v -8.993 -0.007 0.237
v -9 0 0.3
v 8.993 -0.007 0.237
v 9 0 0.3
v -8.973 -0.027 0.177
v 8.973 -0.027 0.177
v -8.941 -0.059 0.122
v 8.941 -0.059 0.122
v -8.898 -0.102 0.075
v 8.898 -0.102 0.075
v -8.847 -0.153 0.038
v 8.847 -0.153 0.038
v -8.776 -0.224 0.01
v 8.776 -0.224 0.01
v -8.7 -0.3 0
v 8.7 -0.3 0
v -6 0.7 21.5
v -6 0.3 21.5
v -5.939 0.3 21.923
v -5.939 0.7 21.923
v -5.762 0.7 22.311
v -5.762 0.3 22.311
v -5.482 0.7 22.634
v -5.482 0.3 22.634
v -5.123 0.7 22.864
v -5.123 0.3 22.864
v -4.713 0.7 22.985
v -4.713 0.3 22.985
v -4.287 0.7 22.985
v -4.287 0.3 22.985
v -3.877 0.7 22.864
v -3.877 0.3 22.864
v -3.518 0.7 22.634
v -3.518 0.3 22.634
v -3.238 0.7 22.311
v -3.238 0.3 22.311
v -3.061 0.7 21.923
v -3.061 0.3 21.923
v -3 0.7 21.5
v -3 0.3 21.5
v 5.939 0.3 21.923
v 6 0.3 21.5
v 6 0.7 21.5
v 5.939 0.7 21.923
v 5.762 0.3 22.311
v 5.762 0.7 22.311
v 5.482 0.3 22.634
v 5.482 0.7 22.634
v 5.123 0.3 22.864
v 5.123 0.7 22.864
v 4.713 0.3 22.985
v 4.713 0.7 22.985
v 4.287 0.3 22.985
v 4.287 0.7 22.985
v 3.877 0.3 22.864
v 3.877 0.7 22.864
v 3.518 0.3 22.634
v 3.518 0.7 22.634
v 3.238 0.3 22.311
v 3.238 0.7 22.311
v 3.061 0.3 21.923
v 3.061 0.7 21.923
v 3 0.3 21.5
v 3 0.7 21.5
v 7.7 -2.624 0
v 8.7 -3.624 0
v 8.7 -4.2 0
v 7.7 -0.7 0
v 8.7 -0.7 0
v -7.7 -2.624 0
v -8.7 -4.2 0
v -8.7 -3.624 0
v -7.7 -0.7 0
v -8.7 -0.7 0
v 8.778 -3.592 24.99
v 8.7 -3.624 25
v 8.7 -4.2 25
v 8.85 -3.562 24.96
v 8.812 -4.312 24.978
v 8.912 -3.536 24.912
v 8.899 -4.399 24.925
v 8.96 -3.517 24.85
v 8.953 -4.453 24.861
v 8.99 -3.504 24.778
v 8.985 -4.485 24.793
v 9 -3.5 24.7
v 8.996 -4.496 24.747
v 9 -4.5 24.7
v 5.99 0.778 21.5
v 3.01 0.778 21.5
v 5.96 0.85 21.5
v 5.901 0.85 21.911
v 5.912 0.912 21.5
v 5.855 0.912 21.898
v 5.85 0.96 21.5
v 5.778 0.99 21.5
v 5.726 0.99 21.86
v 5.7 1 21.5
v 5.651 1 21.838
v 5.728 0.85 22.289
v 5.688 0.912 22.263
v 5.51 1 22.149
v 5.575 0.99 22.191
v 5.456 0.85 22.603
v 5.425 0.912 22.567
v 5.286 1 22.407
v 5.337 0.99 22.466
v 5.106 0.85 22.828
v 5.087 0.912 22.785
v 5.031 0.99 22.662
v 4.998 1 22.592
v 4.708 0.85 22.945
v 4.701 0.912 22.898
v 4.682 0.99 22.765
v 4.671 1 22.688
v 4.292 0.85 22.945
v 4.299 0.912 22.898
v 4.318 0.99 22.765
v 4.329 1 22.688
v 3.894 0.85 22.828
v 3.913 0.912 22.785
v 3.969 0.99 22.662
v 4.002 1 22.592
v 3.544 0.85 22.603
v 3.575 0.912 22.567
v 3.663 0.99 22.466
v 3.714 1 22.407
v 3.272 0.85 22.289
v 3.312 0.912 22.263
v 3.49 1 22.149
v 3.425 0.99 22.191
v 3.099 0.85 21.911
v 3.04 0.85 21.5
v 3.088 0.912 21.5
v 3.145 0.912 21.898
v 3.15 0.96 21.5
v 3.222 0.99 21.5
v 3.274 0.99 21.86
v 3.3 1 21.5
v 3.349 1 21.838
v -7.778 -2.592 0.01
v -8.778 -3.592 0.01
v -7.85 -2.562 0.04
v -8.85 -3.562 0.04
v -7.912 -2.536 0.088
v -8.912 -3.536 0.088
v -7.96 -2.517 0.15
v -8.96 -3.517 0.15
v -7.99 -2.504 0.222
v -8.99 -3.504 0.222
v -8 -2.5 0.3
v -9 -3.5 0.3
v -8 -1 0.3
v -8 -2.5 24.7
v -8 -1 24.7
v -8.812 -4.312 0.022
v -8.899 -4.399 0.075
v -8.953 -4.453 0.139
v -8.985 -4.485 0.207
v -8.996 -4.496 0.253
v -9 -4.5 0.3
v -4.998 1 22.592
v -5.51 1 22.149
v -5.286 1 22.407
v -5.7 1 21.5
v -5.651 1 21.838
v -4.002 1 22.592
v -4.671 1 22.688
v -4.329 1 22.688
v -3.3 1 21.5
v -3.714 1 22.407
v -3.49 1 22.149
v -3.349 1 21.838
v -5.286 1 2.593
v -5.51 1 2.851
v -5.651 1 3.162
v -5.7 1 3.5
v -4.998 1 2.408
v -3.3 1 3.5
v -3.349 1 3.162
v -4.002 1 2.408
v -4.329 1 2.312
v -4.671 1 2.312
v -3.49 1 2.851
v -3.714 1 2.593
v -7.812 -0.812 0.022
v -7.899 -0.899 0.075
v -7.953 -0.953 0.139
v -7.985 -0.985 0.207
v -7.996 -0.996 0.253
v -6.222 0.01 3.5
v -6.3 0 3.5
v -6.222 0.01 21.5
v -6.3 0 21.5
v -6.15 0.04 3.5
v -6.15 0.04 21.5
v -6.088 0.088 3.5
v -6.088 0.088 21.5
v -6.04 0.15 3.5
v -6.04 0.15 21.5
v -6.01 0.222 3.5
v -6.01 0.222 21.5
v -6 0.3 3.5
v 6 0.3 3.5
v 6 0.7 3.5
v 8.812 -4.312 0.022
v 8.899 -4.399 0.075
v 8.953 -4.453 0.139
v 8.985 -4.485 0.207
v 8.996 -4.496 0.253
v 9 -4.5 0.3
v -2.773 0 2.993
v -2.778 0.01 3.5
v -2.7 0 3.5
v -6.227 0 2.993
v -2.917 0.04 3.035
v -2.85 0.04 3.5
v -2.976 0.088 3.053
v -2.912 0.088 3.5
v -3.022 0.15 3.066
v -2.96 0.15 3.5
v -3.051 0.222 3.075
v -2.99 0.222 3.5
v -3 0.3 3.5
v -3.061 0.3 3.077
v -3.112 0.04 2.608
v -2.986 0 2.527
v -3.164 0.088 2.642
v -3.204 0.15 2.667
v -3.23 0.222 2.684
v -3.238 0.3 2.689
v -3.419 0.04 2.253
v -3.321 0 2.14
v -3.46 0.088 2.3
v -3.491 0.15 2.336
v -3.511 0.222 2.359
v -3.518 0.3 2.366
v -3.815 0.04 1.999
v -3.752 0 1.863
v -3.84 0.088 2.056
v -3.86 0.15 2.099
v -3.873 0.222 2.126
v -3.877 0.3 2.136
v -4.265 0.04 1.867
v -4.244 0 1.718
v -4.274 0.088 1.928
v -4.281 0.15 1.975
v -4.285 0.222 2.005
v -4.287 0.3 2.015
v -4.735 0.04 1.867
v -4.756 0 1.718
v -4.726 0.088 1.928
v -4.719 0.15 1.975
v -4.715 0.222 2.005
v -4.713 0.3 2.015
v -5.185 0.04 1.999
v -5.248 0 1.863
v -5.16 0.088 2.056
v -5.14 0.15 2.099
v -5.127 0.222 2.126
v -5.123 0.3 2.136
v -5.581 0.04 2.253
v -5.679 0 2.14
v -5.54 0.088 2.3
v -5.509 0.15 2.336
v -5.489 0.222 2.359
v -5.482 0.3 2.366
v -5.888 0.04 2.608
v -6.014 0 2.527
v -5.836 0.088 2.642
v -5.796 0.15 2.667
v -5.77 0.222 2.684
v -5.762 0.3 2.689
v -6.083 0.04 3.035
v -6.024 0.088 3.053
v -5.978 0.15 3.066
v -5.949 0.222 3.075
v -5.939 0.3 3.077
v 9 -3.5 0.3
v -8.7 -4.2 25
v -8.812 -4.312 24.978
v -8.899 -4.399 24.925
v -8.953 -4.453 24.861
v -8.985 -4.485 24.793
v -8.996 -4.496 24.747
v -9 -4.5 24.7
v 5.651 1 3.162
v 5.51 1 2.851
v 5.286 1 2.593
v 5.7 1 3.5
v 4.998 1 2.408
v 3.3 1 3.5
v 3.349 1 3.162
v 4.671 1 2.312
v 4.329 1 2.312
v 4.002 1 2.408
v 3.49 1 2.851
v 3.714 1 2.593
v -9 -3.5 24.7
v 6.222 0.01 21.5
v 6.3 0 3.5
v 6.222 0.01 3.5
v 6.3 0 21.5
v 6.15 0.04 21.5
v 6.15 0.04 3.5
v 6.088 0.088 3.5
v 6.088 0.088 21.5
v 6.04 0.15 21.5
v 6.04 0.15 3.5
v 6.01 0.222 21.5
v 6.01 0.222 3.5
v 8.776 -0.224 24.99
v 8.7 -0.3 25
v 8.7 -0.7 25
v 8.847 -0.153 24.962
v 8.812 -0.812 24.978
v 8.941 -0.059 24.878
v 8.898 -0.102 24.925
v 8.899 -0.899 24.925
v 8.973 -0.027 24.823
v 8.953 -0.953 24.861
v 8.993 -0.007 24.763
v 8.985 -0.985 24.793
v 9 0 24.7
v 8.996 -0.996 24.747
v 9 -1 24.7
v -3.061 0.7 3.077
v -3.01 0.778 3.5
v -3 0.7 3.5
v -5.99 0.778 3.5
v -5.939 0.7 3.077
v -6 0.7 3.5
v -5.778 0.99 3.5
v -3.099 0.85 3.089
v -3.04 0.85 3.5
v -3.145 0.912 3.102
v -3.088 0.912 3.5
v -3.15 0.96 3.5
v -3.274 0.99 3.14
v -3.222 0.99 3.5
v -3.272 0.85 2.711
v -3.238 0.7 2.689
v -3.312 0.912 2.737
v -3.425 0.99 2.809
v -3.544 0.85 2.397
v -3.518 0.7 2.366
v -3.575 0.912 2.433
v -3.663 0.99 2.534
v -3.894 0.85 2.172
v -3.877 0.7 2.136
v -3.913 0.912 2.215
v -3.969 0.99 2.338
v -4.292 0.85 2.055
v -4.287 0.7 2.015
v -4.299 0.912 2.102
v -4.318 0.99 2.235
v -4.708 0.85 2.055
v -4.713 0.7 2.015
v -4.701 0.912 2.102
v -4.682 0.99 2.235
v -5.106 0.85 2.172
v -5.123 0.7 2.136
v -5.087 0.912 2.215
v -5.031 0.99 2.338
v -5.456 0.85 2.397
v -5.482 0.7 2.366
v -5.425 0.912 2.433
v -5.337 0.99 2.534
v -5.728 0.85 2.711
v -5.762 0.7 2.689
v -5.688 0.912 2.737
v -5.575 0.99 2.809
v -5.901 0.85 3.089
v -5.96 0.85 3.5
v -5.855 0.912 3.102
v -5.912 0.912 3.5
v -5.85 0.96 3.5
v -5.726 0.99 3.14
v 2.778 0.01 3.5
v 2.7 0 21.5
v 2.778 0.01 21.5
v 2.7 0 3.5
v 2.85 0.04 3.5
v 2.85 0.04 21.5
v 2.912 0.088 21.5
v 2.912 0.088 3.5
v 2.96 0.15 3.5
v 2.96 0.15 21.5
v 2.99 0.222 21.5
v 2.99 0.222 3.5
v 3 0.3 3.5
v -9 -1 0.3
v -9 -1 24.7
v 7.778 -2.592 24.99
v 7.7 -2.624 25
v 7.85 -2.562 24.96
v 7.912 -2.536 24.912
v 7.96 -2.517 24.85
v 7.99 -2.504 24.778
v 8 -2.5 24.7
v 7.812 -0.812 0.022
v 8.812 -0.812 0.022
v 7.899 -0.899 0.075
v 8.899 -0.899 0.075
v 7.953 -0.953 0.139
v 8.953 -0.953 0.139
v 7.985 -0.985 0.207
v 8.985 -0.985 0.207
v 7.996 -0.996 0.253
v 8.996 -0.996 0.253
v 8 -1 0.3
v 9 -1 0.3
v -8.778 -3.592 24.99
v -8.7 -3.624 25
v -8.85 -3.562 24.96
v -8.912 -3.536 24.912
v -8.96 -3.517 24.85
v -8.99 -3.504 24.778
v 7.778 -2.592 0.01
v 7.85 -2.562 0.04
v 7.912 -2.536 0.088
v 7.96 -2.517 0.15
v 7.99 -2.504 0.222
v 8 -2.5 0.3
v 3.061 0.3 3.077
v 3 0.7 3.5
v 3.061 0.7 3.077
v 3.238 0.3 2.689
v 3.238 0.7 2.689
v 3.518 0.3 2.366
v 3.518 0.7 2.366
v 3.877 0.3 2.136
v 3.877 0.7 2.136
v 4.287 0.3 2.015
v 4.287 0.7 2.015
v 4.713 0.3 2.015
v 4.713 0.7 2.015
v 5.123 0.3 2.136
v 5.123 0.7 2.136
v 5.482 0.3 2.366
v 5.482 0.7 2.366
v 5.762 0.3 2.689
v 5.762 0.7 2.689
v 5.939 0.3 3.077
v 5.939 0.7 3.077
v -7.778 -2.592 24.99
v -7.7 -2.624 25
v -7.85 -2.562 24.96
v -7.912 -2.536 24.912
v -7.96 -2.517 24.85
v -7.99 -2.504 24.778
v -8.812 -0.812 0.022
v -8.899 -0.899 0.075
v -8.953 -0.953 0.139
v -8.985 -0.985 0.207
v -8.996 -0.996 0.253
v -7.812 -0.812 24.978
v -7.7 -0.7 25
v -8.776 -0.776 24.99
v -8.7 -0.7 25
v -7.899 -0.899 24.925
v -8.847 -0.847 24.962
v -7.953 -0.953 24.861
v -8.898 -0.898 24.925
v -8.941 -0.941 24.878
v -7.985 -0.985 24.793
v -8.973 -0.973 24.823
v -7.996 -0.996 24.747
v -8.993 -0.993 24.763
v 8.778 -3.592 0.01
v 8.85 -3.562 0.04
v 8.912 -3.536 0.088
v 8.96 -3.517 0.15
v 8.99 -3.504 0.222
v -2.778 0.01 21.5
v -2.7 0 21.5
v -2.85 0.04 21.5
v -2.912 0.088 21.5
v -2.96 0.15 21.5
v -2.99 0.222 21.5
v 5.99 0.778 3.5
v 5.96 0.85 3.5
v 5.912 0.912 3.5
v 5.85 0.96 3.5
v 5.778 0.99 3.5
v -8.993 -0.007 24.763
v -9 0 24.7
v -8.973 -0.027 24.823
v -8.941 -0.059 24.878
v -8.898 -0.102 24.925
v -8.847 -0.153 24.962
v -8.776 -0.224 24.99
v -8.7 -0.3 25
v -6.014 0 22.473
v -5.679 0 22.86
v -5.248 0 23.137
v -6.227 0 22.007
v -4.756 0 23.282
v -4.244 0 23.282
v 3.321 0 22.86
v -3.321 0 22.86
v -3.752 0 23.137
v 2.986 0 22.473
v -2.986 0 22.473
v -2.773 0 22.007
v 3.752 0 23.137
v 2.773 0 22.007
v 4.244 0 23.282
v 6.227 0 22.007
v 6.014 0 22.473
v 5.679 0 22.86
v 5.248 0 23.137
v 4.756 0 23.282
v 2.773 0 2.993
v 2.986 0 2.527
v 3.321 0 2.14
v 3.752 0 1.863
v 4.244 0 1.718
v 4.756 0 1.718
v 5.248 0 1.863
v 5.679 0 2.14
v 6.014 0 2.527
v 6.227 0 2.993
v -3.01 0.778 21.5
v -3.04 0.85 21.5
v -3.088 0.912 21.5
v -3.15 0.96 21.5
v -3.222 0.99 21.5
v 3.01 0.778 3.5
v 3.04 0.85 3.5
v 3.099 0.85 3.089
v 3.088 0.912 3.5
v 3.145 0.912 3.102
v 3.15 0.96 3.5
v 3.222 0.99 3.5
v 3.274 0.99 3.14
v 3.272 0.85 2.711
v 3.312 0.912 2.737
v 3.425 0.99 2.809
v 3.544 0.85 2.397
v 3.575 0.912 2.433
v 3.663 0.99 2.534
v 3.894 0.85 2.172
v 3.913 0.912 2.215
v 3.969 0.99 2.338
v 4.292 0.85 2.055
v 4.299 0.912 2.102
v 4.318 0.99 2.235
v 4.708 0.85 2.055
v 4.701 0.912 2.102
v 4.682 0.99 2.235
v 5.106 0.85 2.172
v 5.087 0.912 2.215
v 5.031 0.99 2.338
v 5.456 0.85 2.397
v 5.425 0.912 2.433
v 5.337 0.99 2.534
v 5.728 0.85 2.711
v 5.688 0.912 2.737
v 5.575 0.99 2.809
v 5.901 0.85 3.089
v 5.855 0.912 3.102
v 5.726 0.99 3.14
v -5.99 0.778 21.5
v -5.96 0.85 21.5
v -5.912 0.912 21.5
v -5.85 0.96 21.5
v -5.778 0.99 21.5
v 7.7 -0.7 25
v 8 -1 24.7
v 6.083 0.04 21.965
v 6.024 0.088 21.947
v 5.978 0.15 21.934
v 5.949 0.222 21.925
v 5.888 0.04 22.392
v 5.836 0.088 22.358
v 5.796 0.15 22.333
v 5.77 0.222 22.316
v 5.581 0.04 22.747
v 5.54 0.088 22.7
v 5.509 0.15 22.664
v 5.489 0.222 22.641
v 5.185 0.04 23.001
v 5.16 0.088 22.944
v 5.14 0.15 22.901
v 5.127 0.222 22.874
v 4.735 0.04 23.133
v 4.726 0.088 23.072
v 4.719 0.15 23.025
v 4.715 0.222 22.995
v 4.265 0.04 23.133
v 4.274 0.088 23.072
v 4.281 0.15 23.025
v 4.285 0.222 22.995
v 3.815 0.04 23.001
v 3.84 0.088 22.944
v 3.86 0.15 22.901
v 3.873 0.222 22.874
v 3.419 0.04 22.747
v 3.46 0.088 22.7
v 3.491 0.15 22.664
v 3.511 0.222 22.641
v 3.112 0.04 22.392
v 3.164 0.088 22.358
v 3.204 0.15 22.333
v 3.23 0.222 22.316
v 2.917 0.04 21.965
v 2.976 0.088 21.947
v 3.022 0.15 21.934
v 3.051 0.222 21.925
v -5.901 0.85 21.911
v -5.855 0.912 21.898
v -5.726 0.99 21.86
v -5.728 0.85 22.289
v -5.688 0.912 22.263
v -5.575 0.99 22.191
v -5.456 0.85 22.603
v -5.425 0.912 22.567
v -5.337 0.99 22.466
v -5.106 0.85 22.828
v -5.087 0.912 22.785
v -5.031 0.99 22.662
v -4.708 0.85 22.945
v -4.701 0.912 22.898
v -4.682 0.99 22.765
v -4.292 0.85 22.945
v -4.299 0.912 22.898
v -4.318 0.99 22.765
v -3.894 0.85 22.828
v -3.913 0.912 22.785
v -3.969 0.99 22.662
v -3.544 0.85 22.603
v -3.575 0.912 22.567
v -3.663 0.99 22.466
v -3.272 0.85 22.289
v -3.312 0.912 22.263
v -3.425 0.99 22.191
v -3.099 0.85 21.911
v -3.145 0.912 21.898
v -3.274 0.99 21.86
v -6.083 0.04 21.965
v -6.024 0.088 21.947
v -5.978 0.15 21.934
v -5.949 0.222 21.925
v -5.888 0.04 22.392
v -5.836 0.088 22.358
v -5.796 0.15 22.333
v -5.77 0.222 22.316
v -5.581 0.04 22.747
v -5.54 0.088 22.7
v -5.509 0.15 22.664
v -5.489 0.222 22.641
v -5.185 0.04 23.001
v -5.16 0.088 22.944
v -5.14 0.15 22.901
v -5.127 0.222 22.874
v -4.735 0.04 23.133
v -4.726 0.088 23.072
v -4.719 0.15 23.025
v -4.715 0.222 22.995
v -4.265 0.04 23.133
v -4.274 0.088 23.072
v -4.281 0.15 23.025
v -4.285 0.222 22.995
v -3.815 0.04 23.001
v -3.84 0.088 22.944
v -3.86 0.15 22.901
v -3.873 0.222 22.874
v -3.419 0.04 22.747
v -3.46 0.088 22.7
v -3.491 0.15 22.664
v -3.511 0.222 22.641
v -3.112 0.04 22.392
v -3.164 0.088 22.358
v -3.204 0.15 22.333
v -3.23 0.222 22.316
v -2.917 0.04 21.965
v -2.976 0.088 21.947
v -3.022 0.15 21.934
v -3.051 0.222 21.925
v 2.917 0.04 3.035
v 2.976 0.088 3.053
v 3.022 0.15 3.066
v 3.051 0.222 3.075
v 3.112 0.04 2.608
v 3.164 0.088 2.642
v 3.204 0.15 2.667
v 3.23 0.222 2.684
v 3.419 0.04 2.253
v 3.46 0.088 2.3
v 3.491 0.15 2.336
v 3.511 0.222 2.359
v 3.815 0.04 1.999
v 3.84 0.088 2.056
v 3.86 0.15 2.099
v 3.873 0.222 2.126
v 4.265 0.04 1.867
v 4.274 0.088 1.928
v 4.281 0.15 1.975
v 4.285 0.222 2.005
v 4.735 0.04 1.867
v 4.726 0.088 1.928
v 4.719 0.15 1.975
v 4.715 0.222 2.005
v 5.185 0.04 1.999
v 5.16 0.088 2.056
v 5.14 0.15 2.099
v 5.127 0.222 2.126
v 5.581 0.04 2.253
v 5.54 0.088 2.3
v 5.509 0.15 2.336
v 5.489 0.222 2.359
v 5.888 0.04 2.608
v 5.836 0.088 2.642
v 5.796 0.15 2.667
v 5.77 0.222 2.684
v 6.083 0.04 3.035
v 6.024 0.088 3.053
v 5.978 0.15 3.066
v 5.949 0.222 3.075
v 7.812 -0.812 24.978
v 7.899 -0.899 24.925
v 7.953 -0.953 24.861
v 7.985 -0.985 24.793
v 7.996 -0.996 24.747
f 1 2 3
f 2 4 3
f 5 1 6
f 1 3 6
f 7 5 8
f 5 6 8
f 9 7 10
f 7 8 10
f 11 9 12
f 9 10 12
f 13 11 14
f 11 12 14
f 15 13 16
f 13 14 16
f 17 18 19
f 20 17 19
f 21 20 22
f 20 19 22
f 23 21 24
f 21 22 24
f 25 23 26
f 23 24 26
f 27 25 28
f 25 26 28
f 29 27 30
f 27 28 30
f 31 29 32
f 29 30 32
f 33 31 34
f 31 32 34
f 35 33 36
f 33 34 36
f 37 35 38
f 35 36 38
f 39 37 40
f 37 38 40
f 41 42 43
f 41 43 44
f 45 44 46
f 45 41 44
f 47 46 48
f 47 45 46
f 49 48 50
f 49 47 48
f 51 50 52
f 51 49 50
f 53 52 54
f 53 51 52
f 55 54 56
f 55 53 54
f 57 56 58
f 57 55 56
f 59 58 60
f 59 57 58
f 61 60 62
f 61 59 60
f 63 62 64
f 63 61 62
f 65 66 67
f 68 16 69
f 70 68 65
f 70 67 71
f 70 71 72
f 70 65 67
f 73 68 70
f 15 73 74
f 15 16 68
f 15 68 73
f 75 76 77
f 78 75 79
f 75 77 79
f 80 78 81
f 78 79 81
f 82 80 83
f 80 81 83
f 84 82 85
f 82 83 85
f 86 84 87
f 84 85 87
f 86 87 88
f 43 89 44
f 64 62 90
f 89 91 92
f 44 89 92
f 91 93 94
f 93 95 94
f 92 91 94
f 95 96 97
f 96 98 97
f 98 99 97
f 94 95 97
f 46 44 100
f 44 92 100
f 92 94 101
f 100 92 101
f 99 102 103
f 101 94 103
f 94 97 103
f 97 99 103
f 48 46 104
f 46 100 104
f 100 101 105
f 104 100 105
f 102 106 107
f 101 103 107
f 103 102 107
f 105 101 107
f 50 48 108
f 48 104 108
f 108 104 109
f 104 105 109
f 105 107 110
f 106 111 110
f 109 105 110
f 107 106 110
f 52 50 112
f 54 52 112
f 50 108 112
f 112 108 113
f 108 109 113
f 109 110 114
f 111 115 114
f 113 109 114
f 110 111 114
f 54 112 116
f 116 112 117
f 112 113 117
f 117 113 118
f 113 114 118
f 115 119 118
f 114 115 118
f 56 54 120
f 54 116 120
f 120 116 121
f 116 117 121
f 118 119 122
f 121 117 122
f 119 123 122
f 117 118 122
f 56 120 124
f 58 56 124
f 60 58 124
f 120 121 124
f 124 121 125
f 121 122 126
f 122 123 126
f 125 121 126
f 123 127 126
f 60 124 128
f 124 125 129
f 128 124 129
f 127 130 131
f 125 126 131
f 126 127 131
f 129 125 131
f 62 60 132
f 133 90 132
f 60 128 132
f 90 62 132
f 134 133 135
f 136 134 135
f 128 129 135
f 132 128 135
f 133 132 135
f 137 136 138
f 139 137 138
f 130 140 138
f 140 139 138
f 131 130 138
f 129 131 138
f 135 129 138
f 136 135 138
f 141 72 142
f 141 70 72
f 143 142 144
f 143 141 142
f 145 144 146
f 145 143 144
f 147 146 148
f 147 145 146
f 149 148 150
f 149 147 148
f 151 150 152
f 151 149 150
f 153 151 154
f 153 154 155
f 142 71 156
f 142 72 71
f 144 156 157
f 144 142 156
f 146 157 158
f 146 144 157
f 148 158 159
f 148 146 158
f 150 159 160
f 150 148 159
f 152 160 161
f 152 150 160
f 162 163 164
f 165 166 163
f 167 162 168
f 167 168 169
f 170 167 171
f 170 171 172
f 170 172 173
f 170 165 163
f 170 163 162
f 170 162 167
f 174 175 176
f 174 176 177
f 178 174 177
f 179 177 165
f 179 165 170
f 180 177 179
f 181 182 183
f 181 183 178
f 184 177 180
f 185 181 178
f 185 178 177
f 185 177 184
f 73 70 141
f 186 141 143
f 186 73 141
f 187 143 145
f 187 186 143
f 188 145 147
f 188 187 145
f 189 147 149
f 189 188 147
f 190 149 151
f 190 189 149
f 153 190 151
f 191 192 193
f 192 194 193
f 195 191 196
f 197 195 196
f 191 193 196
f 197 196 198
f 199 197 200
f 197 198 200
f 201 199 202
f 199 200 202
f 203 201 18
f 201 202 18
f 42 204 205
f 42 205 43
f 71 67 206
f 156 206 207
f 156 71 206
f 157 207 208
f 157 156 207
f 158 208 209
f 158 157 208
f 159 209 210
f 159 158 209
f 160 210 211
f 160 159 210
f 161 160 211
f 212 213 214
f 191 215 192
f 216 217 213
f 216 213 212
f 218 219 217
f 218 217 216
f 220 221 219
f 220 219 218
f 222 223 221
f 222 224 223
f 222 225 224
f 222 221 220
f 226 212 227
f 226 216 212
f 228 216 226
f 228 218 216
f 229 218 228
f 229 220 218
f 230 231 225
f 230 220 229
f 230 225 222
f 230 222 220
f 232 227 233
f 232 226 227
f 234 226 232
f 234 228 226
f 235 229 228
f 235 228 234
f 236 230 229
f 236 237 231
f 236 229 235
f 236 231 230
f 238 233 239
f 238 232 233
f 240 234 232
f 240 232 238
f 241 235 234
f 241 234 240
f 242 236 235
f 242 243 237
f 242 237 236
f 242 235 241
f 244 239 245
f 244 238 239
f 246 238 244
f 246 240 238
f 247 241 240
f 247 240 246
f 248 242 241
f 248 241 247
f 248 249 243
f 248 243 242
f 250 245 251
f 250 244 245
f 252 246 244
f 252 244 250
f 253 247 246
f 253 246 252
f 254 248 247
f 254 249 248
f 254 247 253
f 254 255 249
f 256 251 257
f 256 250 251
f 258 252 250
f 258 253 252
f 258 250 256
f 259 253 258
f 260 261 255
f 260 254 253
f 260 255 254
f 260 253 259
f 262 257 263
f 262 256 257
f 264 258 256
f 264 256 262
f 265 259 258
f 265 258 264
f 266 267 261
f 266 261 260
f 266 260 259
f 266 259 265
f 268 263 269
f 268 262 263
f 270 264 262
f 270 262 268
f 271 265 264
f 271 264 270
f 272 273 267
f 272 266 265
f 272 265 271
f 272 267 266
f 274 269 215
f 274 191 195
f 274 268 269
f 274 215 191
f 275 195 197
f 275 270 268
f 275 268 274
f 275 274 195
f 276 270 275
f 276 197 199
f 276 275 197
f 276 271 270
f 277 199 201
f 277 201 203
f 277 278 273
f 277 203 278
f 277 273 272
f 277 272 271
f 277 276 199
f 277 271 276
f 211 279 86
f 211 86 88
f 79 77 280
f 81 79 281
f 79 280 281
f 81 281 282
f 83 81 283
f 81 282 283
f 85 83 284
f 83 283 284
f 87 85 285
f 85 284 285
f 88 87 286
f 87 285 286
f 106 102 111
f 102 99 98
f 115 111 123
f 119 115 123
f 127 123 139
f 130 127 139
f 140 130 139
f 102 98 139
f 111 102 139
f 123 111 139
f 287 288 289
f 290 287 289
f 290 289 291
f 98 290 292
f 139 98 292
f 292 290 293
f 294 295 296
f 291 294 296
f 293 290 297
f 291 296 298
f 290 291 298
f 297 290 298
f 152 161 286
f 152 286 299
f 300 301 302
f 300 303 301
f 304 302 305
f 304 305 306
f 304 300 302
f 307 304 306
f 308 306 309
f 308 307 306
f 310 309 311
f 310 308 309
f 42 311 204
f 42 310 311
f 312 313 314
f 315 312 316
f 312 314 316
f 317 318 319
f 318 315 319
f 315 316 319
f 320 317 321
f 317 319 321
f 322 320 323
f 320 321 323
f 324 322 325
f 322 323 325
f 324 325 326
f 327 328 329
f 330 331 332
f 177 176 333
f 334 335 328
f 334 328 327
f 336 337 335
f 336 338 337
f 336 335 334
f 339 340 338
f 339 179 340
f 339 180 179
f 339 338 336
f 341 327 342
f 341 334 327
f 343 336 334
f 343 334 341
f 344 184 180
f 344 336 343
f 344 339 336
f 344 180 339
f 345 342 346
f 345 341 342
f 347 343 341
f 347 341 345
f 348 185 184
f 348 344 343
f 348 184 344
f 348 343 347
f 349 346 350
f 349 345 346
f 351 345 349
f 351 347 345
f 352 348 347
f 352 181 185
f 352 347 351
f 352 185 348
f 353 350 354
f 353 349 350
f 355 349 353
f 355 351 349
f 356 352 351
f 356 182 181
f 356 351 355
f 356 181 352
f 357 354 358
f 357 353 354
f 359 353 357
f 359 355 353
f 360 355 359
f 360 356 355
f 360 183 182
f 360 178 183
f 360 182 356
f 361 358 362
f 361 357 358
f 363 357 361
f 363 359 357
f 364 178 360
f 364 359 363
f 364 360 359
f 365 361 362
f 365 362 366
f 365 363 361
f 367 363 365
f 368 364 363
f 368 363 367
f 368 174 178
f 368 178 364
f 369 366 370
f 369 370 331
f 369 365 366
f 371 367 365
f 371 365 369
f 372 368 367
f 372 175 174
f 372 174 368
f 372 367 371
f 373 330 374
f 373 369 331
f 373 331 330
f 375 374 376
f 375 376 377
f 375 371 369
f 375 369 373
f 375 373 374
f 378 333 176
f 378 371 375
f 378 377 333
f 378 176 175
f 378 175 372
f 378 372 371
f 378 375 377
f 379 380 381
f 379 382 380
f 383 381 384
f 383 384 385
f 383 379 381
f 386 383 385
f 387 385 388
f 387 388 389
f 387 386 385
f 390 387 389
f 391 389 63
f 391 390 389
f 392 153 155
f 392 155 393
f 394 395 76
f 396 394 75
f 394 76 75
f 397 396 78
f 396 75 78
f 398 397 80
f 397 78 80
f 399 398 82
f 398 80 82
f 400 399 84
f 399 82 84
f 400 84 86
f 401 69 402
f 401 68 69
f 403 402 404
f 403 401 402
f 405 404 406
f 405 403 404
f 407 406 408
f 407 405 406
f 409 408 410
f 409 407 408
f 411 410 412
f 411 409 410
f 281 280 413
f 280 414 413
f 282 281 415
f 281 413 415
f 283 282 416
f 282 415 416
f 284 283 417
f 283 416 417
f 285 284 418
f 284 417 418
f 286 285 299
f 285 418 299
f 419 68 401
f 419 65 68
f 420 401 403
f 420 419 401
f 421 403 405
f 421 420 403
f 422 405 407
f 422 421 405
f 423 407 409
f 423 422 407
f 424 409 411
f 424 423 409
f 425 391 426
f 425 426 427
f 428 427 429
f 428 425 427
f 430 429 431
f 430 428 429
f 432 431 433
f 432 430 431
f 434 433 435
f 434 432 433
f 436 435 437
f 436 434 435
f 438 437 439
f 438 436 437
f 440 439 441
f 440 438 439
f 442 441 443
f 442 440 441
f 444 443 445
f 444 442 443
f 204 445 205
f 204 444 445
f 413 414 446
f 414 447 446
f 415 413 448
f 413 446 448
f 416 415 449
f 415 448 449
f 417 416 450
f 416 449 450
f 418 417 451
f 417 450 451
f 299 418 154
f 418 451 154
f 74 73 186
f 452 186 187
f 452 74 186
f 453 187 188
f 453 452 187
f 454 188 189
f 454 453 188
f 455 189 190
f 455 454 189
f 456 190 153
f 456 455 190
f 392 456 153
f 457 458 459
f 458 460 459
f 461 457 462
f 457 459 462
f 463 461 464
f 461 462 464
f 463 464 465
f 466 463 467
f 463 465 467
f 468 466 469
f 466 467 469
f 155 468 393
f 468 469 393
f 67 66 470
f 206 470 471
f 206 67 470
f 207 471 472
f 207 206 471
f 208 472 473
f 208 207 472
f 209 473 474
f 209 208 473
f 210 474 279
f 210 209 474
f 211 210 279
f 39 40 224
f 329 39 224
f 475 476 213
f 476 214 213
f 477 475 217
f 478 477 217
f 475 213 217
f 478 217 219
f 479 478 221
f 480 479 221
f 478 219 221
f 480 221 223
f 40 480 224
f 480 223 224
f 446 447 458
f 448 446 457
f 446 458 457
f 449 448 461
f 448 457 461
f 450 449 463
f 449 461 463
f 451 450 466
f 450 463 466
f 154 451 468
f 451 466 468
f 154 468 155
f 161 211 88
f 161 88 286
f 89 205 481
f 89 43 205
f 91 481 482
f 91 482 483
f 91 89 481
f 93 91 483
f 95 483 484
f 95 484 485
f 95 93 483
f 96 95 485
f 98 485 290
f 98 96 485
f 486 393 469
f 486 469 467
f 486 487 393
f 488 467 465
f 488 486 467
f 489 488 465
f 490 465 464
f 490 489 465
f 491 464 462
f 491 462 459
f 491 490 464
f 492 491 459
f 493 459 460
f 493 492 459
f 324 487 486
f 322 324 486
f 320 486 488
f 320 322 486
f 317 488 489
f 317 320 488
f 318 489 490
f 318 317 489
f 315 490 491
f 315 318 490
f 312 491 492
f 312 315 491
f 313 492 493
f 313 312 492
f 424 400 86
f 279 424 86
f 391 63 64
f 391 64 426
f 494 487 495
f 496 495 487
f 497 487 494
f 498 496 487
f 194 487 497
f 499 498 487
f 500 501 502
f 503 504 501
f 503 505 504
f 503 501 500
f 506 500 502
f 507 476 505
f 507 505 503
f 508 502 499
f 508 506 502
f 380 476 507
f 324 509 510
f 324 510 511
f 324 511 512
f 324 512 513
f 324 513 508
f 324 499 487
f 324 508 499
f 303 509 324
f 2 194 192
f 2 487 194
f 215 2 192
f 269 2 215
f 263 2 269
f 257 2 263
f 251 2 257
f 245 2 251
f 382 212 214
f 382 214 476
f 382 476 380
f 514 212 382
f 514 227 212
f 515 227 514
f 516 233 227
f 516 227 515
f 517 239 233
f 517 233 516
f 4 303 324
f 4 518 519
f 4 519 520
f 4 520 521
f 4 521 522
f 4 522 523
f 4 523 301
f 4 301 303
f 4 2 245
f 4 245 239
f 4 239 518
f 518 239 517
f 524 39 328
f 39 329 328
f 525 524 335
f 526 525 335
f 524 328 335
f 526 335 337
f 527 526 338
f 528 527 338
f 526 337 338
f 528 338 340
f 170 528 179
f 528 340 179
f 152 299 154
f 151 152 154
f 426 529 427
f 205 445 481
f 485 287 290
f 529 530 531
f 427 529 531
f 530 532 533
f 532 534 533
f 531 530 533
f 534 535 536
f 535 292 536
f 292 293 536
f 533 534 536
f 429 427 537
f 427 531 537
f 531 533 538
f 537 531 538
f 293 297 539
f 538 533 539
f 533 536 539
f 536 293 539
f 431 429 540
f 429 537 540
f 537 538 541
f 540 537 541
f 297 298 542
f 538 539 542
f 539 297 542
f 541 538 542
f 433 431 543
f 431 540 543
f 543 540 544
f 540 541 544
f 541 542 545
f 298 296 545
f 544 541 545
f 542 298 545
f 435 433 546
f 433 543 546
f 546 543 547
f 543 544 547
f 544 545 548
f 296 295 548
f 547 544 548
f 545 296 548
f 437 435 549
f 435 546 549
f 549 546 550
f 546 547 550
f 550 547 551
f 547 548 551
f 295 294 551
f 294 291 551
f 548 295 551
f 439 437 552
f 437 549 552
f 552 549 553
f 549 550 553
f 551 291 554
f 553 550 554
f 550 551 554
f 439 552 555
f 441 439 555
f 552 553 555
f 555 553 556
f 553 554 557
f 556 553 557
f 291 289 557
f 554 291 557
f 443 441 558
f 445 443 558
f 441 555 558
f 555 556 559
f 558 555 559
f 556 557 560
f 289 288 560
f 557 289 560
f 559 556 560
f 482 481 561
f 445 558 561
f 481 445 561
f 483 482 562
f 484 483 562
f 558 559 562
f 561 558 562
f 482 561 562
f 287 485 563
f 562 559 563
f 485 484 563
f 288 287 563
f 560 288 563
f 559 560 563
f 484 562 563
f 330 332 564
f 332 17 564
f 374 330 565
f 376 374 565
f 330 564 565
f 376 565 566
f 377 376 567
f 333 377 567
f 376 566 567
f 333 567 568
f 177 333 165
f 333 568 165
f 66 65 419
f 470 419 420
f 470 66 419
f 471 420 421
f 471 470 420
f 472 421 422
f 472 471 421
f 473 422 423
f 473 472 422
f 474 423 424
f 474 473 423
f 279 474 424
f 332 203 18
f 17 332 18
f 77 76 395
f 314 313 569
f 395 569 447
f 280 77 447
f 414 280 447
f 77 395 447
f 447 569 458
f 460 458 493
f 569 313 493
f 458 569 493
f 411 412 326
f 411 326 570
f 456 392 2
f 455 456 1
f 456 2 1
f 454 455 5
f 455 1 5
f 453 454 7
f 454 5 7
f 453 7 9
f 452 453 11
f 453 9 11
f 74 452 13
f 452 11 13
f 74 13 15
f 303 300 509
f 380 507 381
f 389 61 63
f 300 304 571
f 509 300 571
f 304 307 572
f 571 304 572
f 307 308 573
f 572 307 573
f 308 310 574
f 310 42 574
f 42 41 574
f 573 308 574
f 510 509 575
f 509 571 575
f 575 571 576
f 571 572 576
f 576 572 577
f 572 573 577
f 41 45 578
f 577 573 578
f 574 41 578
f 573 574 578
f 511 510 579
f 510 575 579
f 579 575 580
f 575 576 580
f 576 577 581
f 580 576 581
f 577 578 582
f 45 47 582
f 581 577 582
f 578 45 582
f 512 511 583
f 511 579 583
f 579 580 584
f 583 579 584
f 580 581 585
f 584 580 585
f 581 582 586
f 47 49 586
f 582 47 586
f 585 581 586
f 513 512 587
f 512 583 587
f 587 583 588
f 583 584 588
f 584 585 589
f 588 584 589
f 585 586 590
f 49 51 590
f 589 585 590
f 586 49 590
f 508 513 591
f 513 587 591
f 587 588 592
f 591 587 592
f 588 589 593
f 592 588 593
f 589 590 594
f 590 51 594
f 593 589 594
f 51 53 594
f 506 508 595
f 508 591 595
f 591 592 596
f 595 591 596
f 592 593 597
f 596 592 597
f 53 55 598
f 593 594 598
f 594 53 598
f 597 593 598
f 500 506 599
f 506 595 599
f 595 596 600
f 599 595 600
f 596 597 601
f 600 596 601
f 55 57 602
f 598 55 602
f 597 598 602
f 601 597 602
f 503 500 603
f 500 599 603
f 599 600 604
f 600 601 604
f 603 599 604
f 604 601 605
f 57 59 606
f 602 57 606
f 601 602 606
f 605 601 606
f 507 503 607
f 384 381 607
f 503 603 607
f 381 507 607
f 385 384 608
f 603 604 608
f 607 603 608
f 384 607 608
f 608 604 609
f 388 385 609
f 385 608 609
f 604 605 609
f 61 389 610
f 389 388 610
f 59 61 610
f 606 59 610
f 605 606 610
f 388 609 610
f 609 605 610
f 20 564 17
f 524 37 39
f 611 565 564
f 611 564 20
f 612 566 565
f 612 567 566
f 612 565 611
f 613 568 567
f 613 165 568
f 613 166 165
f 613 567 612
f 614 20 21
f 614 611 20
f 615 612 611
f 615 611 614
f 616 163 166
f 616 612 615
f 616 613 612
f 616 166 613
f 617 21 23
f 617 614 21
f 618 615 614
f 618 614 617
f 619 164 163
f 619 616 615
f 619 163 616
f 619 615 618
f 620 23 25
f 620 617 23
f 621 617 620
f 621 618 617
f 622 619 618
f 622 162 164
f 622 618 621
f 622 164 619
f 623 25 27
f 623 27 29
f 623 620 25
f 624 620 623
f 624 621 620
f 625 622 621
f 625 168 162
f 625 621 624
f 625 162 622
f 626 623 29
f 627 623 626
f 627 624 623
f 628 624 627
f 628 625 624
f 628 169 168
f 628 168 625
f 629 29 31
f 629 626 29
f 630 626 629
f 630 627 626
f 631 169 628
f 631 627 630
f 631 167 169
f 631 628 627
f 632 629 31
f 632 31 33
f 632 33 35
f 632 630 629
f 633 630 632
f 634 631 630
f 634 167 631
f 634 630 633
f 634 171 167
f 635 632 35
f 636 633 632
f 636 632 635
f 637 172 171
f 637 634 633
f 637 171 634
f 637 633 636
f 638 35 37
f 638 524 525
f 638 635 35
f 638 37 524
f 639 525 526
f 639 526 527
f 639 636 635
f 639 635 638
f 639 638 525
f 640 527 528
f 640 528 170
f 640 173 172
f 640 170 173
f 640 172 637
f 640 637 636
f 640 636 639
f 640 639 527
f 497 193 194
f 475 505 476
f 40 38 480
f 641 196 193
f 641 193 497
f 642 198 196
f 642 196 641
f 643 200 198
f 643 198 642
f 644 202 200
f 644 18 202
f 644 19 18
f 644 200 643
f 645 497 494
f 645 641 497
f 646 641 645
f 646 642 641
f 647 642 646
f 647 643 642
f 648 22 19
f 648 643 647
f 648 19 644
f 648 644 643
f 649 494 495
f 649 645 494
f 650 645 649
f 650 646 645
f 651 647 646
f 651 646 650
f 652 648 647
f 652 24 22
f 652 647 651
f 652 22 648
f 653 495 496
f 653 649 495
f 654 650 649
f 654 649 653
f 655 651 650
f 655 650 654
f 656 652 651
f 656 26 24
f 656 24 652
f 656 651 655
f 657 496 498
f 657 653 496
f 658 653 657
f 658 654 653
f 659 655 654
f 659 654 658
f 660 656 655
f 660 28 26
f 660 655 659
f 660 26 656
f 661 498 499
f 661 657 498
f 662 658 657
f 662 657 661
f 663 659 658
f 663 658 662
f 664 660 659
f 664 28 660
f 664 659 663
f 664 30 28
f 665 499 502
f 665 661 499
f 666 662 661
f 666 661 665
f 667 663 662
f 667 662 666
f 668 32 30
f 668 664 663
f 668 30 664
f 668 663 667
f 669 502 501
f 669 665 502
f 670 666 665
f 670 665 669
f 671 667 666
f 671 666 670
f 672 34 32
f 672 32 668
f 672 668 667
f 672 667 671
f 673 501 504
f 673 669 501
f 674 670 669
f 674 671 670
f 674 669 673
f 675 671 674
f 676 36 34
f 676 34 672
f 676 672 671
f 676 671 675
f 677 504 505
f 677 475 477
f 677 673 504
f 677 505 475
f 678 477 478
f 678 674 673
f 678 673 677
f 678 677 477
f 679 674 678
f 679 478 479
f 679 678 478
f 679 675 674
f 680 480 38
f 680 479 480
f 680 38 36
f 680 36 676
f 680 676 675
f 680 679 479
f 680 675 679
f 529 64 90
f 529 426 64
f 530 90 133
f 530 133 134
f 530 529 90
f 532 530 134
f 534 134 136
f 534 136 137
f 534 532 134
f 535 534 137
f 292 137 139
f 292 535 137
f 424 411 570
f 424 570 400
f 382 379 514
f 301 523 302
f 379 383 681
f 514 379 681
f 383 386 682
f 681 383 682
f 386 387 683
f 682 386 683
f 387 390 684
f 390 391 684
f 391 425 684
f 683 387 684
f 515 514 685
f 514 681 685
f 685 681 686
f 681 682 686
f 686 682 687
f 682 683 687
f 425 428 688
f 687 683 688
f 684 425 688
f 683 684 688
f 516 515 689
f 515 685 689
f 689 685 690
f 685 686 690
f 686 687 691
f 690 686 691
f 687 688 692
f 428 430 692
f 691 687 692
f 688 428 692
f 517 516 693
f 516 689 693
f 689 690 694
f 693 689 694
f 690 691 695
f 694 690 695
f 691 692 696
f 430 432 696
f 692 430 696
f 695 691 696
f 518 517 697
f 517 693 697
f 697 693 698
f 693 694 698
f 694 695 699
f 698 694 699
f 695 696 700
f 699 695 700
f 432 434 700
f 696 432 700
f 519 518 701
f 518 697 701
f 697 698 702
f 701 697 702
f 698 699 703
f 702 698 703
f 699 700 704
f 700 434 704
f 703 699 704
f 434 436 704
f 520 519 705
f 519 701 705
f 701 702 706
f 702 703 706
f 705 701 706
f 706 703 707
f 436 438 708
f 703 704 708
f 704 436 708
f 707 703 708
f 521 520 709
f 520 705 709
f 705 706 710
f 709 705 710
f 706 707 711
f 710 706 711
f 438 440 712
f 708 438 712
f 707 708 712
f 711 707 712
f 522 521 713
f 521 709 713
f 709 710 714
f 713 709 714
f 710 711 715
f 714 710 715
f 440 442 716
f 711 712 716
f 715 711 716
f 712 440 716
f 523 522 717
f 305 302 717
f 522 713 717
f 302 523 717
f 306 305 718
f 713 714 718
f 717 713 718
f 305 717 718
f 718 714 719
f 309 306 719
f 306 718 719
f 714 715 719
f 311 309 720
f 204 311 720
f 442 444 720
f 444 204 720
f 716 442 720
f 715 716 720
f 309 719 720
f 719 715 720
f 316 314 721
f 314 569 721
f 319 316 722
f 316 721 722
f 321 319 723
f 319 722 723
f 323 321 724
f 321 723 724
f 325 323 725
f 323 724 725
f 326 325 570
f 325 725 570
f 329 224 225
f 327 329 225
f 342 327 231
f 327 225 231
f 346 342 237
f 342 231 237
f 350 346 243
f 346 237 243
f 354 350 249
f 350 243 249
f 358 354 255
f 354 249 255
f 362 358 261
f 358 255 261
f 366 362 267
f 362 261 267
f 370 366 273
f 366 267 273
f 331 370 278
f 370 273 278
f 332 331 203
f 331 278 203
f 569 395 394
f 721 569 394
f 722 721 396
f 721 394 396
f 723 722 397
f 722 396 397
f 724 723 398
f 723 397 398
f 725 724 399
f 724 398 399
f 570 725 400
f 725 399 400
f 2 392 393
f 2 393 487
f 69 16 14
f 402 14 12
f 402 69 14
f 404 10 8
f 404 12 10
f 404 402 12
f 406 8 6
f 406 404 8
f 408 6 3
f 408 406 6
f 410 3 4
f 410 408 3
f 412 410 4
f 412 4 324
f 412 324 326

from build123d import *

# Parameters (mm, degrees)
BOSS_EXTRUDE1_DEPTH = 25
BOSS_EXTRUDE2_DEPTH = 1
FILLET1_R           = 0.3
FILLET2_R           = 0.3


with BuildPart() as part:
    # Sketch1 → Boss-Extrude1 (new body)
    with BuildSketch(Plane.XY):
        Polygon((8, -1), (8, -2.5), (9, -3.5), (9, -4.5), (-9, -4.5), (-9, -3.5), (-8, -2.5), (-8, -1), (-9, -1), (-9, 0), (9, 0), (9, -1), align=None)
    extrude(amount=BOSS_EXTRUDE1_DEPTH)

    # Sketch2 → Boss-Extrude2 (add)
    with BuildSketch(Plane(origin=(0, 0, 0), x_dir=(1, 0, 0), z_dir=(0, 1, 0))):
        with BuildLine():
            Line((6, -3.5), (6, -21.5))
            ThreePointArc((6, -21.5), (4.5, -23), (3, -21.5))
            Line((3, -21.5), (3, -3.5))
            ThreePointArc((3, -3.5), (4.5, -2), (6, -3.5))
        make_face()
        with BuildLine():
            Line((-6, -3.5), (-6, -21.5))
            ThreePointArc((-6, -21.5), (-4.5, -23), (-3, -21.5))
            Line((-3, -21.5), (-3, -3.5))
            ThreePointArc((-3, -3.5), (-4.5, -2), (-6, -3.5))
        make_face()
    extrude(amount=BOSS_EXTRUDE2_DEPTH)

    # Fillet1
    fillet1_edges = [part.edges().sort_by_distance(p)[0] for p in [
        (4.5, 0, 2),
        (3, 0, 12.5),
        (4.5, 0, 23),
        (6, 0, 12.5),
        (4.5, 1, 2),
        (3, 1, 12.5),
        (4.5, 1, 23),
        (6, 1, 12.5),
        (-4.5, 0, 2),
        (-6, 0, 12.5),
        (-4.5, 0, 23),
        (-3, 0, 12.5),
        (-4.5, 1, 2),
        (-6, 1, 12.5),
        (-4.5, 1, 23),
        (-3, 1, 12.5),
    ]]
    fillet(fillet1_edges, radius=FILLET1_R)

    # Fillet2
    fillet2_edges = [part.edges().sort_by_distance(p)[0] for p in [
        (8, -1.75, 0),
        (8.5, -3, 0),
        (0, 0, 25),
        (9, -4, 0),
        (0, -4.5, 0),
        (-9, -4, 0),
        (-8.5, -3, 0),
        (-8, -1.75, 0),
        (-8.5, -1, 0),
        (-9, -0.5, 0),
        (0, 0, 0),
        (9, -0.5, 0),
        (8.5, -1, 0),
        (-9, -0.5, 25),
        (-8.5, -1, 25),
        (-8, -1.75, 25),
        (-8.5, -3, 25),
        (-9, -4, 25),
        (0, -4.5, 25),
        (9, -4, 25),
        (8.5, -3, 25),
        (8, -1.75, 25),
        (8.5, -1, 25),
        (9, -0.5, 25),
    ]]
    fillet(fillet2_edges, radius=FILLET2_R)


solid = part.part
